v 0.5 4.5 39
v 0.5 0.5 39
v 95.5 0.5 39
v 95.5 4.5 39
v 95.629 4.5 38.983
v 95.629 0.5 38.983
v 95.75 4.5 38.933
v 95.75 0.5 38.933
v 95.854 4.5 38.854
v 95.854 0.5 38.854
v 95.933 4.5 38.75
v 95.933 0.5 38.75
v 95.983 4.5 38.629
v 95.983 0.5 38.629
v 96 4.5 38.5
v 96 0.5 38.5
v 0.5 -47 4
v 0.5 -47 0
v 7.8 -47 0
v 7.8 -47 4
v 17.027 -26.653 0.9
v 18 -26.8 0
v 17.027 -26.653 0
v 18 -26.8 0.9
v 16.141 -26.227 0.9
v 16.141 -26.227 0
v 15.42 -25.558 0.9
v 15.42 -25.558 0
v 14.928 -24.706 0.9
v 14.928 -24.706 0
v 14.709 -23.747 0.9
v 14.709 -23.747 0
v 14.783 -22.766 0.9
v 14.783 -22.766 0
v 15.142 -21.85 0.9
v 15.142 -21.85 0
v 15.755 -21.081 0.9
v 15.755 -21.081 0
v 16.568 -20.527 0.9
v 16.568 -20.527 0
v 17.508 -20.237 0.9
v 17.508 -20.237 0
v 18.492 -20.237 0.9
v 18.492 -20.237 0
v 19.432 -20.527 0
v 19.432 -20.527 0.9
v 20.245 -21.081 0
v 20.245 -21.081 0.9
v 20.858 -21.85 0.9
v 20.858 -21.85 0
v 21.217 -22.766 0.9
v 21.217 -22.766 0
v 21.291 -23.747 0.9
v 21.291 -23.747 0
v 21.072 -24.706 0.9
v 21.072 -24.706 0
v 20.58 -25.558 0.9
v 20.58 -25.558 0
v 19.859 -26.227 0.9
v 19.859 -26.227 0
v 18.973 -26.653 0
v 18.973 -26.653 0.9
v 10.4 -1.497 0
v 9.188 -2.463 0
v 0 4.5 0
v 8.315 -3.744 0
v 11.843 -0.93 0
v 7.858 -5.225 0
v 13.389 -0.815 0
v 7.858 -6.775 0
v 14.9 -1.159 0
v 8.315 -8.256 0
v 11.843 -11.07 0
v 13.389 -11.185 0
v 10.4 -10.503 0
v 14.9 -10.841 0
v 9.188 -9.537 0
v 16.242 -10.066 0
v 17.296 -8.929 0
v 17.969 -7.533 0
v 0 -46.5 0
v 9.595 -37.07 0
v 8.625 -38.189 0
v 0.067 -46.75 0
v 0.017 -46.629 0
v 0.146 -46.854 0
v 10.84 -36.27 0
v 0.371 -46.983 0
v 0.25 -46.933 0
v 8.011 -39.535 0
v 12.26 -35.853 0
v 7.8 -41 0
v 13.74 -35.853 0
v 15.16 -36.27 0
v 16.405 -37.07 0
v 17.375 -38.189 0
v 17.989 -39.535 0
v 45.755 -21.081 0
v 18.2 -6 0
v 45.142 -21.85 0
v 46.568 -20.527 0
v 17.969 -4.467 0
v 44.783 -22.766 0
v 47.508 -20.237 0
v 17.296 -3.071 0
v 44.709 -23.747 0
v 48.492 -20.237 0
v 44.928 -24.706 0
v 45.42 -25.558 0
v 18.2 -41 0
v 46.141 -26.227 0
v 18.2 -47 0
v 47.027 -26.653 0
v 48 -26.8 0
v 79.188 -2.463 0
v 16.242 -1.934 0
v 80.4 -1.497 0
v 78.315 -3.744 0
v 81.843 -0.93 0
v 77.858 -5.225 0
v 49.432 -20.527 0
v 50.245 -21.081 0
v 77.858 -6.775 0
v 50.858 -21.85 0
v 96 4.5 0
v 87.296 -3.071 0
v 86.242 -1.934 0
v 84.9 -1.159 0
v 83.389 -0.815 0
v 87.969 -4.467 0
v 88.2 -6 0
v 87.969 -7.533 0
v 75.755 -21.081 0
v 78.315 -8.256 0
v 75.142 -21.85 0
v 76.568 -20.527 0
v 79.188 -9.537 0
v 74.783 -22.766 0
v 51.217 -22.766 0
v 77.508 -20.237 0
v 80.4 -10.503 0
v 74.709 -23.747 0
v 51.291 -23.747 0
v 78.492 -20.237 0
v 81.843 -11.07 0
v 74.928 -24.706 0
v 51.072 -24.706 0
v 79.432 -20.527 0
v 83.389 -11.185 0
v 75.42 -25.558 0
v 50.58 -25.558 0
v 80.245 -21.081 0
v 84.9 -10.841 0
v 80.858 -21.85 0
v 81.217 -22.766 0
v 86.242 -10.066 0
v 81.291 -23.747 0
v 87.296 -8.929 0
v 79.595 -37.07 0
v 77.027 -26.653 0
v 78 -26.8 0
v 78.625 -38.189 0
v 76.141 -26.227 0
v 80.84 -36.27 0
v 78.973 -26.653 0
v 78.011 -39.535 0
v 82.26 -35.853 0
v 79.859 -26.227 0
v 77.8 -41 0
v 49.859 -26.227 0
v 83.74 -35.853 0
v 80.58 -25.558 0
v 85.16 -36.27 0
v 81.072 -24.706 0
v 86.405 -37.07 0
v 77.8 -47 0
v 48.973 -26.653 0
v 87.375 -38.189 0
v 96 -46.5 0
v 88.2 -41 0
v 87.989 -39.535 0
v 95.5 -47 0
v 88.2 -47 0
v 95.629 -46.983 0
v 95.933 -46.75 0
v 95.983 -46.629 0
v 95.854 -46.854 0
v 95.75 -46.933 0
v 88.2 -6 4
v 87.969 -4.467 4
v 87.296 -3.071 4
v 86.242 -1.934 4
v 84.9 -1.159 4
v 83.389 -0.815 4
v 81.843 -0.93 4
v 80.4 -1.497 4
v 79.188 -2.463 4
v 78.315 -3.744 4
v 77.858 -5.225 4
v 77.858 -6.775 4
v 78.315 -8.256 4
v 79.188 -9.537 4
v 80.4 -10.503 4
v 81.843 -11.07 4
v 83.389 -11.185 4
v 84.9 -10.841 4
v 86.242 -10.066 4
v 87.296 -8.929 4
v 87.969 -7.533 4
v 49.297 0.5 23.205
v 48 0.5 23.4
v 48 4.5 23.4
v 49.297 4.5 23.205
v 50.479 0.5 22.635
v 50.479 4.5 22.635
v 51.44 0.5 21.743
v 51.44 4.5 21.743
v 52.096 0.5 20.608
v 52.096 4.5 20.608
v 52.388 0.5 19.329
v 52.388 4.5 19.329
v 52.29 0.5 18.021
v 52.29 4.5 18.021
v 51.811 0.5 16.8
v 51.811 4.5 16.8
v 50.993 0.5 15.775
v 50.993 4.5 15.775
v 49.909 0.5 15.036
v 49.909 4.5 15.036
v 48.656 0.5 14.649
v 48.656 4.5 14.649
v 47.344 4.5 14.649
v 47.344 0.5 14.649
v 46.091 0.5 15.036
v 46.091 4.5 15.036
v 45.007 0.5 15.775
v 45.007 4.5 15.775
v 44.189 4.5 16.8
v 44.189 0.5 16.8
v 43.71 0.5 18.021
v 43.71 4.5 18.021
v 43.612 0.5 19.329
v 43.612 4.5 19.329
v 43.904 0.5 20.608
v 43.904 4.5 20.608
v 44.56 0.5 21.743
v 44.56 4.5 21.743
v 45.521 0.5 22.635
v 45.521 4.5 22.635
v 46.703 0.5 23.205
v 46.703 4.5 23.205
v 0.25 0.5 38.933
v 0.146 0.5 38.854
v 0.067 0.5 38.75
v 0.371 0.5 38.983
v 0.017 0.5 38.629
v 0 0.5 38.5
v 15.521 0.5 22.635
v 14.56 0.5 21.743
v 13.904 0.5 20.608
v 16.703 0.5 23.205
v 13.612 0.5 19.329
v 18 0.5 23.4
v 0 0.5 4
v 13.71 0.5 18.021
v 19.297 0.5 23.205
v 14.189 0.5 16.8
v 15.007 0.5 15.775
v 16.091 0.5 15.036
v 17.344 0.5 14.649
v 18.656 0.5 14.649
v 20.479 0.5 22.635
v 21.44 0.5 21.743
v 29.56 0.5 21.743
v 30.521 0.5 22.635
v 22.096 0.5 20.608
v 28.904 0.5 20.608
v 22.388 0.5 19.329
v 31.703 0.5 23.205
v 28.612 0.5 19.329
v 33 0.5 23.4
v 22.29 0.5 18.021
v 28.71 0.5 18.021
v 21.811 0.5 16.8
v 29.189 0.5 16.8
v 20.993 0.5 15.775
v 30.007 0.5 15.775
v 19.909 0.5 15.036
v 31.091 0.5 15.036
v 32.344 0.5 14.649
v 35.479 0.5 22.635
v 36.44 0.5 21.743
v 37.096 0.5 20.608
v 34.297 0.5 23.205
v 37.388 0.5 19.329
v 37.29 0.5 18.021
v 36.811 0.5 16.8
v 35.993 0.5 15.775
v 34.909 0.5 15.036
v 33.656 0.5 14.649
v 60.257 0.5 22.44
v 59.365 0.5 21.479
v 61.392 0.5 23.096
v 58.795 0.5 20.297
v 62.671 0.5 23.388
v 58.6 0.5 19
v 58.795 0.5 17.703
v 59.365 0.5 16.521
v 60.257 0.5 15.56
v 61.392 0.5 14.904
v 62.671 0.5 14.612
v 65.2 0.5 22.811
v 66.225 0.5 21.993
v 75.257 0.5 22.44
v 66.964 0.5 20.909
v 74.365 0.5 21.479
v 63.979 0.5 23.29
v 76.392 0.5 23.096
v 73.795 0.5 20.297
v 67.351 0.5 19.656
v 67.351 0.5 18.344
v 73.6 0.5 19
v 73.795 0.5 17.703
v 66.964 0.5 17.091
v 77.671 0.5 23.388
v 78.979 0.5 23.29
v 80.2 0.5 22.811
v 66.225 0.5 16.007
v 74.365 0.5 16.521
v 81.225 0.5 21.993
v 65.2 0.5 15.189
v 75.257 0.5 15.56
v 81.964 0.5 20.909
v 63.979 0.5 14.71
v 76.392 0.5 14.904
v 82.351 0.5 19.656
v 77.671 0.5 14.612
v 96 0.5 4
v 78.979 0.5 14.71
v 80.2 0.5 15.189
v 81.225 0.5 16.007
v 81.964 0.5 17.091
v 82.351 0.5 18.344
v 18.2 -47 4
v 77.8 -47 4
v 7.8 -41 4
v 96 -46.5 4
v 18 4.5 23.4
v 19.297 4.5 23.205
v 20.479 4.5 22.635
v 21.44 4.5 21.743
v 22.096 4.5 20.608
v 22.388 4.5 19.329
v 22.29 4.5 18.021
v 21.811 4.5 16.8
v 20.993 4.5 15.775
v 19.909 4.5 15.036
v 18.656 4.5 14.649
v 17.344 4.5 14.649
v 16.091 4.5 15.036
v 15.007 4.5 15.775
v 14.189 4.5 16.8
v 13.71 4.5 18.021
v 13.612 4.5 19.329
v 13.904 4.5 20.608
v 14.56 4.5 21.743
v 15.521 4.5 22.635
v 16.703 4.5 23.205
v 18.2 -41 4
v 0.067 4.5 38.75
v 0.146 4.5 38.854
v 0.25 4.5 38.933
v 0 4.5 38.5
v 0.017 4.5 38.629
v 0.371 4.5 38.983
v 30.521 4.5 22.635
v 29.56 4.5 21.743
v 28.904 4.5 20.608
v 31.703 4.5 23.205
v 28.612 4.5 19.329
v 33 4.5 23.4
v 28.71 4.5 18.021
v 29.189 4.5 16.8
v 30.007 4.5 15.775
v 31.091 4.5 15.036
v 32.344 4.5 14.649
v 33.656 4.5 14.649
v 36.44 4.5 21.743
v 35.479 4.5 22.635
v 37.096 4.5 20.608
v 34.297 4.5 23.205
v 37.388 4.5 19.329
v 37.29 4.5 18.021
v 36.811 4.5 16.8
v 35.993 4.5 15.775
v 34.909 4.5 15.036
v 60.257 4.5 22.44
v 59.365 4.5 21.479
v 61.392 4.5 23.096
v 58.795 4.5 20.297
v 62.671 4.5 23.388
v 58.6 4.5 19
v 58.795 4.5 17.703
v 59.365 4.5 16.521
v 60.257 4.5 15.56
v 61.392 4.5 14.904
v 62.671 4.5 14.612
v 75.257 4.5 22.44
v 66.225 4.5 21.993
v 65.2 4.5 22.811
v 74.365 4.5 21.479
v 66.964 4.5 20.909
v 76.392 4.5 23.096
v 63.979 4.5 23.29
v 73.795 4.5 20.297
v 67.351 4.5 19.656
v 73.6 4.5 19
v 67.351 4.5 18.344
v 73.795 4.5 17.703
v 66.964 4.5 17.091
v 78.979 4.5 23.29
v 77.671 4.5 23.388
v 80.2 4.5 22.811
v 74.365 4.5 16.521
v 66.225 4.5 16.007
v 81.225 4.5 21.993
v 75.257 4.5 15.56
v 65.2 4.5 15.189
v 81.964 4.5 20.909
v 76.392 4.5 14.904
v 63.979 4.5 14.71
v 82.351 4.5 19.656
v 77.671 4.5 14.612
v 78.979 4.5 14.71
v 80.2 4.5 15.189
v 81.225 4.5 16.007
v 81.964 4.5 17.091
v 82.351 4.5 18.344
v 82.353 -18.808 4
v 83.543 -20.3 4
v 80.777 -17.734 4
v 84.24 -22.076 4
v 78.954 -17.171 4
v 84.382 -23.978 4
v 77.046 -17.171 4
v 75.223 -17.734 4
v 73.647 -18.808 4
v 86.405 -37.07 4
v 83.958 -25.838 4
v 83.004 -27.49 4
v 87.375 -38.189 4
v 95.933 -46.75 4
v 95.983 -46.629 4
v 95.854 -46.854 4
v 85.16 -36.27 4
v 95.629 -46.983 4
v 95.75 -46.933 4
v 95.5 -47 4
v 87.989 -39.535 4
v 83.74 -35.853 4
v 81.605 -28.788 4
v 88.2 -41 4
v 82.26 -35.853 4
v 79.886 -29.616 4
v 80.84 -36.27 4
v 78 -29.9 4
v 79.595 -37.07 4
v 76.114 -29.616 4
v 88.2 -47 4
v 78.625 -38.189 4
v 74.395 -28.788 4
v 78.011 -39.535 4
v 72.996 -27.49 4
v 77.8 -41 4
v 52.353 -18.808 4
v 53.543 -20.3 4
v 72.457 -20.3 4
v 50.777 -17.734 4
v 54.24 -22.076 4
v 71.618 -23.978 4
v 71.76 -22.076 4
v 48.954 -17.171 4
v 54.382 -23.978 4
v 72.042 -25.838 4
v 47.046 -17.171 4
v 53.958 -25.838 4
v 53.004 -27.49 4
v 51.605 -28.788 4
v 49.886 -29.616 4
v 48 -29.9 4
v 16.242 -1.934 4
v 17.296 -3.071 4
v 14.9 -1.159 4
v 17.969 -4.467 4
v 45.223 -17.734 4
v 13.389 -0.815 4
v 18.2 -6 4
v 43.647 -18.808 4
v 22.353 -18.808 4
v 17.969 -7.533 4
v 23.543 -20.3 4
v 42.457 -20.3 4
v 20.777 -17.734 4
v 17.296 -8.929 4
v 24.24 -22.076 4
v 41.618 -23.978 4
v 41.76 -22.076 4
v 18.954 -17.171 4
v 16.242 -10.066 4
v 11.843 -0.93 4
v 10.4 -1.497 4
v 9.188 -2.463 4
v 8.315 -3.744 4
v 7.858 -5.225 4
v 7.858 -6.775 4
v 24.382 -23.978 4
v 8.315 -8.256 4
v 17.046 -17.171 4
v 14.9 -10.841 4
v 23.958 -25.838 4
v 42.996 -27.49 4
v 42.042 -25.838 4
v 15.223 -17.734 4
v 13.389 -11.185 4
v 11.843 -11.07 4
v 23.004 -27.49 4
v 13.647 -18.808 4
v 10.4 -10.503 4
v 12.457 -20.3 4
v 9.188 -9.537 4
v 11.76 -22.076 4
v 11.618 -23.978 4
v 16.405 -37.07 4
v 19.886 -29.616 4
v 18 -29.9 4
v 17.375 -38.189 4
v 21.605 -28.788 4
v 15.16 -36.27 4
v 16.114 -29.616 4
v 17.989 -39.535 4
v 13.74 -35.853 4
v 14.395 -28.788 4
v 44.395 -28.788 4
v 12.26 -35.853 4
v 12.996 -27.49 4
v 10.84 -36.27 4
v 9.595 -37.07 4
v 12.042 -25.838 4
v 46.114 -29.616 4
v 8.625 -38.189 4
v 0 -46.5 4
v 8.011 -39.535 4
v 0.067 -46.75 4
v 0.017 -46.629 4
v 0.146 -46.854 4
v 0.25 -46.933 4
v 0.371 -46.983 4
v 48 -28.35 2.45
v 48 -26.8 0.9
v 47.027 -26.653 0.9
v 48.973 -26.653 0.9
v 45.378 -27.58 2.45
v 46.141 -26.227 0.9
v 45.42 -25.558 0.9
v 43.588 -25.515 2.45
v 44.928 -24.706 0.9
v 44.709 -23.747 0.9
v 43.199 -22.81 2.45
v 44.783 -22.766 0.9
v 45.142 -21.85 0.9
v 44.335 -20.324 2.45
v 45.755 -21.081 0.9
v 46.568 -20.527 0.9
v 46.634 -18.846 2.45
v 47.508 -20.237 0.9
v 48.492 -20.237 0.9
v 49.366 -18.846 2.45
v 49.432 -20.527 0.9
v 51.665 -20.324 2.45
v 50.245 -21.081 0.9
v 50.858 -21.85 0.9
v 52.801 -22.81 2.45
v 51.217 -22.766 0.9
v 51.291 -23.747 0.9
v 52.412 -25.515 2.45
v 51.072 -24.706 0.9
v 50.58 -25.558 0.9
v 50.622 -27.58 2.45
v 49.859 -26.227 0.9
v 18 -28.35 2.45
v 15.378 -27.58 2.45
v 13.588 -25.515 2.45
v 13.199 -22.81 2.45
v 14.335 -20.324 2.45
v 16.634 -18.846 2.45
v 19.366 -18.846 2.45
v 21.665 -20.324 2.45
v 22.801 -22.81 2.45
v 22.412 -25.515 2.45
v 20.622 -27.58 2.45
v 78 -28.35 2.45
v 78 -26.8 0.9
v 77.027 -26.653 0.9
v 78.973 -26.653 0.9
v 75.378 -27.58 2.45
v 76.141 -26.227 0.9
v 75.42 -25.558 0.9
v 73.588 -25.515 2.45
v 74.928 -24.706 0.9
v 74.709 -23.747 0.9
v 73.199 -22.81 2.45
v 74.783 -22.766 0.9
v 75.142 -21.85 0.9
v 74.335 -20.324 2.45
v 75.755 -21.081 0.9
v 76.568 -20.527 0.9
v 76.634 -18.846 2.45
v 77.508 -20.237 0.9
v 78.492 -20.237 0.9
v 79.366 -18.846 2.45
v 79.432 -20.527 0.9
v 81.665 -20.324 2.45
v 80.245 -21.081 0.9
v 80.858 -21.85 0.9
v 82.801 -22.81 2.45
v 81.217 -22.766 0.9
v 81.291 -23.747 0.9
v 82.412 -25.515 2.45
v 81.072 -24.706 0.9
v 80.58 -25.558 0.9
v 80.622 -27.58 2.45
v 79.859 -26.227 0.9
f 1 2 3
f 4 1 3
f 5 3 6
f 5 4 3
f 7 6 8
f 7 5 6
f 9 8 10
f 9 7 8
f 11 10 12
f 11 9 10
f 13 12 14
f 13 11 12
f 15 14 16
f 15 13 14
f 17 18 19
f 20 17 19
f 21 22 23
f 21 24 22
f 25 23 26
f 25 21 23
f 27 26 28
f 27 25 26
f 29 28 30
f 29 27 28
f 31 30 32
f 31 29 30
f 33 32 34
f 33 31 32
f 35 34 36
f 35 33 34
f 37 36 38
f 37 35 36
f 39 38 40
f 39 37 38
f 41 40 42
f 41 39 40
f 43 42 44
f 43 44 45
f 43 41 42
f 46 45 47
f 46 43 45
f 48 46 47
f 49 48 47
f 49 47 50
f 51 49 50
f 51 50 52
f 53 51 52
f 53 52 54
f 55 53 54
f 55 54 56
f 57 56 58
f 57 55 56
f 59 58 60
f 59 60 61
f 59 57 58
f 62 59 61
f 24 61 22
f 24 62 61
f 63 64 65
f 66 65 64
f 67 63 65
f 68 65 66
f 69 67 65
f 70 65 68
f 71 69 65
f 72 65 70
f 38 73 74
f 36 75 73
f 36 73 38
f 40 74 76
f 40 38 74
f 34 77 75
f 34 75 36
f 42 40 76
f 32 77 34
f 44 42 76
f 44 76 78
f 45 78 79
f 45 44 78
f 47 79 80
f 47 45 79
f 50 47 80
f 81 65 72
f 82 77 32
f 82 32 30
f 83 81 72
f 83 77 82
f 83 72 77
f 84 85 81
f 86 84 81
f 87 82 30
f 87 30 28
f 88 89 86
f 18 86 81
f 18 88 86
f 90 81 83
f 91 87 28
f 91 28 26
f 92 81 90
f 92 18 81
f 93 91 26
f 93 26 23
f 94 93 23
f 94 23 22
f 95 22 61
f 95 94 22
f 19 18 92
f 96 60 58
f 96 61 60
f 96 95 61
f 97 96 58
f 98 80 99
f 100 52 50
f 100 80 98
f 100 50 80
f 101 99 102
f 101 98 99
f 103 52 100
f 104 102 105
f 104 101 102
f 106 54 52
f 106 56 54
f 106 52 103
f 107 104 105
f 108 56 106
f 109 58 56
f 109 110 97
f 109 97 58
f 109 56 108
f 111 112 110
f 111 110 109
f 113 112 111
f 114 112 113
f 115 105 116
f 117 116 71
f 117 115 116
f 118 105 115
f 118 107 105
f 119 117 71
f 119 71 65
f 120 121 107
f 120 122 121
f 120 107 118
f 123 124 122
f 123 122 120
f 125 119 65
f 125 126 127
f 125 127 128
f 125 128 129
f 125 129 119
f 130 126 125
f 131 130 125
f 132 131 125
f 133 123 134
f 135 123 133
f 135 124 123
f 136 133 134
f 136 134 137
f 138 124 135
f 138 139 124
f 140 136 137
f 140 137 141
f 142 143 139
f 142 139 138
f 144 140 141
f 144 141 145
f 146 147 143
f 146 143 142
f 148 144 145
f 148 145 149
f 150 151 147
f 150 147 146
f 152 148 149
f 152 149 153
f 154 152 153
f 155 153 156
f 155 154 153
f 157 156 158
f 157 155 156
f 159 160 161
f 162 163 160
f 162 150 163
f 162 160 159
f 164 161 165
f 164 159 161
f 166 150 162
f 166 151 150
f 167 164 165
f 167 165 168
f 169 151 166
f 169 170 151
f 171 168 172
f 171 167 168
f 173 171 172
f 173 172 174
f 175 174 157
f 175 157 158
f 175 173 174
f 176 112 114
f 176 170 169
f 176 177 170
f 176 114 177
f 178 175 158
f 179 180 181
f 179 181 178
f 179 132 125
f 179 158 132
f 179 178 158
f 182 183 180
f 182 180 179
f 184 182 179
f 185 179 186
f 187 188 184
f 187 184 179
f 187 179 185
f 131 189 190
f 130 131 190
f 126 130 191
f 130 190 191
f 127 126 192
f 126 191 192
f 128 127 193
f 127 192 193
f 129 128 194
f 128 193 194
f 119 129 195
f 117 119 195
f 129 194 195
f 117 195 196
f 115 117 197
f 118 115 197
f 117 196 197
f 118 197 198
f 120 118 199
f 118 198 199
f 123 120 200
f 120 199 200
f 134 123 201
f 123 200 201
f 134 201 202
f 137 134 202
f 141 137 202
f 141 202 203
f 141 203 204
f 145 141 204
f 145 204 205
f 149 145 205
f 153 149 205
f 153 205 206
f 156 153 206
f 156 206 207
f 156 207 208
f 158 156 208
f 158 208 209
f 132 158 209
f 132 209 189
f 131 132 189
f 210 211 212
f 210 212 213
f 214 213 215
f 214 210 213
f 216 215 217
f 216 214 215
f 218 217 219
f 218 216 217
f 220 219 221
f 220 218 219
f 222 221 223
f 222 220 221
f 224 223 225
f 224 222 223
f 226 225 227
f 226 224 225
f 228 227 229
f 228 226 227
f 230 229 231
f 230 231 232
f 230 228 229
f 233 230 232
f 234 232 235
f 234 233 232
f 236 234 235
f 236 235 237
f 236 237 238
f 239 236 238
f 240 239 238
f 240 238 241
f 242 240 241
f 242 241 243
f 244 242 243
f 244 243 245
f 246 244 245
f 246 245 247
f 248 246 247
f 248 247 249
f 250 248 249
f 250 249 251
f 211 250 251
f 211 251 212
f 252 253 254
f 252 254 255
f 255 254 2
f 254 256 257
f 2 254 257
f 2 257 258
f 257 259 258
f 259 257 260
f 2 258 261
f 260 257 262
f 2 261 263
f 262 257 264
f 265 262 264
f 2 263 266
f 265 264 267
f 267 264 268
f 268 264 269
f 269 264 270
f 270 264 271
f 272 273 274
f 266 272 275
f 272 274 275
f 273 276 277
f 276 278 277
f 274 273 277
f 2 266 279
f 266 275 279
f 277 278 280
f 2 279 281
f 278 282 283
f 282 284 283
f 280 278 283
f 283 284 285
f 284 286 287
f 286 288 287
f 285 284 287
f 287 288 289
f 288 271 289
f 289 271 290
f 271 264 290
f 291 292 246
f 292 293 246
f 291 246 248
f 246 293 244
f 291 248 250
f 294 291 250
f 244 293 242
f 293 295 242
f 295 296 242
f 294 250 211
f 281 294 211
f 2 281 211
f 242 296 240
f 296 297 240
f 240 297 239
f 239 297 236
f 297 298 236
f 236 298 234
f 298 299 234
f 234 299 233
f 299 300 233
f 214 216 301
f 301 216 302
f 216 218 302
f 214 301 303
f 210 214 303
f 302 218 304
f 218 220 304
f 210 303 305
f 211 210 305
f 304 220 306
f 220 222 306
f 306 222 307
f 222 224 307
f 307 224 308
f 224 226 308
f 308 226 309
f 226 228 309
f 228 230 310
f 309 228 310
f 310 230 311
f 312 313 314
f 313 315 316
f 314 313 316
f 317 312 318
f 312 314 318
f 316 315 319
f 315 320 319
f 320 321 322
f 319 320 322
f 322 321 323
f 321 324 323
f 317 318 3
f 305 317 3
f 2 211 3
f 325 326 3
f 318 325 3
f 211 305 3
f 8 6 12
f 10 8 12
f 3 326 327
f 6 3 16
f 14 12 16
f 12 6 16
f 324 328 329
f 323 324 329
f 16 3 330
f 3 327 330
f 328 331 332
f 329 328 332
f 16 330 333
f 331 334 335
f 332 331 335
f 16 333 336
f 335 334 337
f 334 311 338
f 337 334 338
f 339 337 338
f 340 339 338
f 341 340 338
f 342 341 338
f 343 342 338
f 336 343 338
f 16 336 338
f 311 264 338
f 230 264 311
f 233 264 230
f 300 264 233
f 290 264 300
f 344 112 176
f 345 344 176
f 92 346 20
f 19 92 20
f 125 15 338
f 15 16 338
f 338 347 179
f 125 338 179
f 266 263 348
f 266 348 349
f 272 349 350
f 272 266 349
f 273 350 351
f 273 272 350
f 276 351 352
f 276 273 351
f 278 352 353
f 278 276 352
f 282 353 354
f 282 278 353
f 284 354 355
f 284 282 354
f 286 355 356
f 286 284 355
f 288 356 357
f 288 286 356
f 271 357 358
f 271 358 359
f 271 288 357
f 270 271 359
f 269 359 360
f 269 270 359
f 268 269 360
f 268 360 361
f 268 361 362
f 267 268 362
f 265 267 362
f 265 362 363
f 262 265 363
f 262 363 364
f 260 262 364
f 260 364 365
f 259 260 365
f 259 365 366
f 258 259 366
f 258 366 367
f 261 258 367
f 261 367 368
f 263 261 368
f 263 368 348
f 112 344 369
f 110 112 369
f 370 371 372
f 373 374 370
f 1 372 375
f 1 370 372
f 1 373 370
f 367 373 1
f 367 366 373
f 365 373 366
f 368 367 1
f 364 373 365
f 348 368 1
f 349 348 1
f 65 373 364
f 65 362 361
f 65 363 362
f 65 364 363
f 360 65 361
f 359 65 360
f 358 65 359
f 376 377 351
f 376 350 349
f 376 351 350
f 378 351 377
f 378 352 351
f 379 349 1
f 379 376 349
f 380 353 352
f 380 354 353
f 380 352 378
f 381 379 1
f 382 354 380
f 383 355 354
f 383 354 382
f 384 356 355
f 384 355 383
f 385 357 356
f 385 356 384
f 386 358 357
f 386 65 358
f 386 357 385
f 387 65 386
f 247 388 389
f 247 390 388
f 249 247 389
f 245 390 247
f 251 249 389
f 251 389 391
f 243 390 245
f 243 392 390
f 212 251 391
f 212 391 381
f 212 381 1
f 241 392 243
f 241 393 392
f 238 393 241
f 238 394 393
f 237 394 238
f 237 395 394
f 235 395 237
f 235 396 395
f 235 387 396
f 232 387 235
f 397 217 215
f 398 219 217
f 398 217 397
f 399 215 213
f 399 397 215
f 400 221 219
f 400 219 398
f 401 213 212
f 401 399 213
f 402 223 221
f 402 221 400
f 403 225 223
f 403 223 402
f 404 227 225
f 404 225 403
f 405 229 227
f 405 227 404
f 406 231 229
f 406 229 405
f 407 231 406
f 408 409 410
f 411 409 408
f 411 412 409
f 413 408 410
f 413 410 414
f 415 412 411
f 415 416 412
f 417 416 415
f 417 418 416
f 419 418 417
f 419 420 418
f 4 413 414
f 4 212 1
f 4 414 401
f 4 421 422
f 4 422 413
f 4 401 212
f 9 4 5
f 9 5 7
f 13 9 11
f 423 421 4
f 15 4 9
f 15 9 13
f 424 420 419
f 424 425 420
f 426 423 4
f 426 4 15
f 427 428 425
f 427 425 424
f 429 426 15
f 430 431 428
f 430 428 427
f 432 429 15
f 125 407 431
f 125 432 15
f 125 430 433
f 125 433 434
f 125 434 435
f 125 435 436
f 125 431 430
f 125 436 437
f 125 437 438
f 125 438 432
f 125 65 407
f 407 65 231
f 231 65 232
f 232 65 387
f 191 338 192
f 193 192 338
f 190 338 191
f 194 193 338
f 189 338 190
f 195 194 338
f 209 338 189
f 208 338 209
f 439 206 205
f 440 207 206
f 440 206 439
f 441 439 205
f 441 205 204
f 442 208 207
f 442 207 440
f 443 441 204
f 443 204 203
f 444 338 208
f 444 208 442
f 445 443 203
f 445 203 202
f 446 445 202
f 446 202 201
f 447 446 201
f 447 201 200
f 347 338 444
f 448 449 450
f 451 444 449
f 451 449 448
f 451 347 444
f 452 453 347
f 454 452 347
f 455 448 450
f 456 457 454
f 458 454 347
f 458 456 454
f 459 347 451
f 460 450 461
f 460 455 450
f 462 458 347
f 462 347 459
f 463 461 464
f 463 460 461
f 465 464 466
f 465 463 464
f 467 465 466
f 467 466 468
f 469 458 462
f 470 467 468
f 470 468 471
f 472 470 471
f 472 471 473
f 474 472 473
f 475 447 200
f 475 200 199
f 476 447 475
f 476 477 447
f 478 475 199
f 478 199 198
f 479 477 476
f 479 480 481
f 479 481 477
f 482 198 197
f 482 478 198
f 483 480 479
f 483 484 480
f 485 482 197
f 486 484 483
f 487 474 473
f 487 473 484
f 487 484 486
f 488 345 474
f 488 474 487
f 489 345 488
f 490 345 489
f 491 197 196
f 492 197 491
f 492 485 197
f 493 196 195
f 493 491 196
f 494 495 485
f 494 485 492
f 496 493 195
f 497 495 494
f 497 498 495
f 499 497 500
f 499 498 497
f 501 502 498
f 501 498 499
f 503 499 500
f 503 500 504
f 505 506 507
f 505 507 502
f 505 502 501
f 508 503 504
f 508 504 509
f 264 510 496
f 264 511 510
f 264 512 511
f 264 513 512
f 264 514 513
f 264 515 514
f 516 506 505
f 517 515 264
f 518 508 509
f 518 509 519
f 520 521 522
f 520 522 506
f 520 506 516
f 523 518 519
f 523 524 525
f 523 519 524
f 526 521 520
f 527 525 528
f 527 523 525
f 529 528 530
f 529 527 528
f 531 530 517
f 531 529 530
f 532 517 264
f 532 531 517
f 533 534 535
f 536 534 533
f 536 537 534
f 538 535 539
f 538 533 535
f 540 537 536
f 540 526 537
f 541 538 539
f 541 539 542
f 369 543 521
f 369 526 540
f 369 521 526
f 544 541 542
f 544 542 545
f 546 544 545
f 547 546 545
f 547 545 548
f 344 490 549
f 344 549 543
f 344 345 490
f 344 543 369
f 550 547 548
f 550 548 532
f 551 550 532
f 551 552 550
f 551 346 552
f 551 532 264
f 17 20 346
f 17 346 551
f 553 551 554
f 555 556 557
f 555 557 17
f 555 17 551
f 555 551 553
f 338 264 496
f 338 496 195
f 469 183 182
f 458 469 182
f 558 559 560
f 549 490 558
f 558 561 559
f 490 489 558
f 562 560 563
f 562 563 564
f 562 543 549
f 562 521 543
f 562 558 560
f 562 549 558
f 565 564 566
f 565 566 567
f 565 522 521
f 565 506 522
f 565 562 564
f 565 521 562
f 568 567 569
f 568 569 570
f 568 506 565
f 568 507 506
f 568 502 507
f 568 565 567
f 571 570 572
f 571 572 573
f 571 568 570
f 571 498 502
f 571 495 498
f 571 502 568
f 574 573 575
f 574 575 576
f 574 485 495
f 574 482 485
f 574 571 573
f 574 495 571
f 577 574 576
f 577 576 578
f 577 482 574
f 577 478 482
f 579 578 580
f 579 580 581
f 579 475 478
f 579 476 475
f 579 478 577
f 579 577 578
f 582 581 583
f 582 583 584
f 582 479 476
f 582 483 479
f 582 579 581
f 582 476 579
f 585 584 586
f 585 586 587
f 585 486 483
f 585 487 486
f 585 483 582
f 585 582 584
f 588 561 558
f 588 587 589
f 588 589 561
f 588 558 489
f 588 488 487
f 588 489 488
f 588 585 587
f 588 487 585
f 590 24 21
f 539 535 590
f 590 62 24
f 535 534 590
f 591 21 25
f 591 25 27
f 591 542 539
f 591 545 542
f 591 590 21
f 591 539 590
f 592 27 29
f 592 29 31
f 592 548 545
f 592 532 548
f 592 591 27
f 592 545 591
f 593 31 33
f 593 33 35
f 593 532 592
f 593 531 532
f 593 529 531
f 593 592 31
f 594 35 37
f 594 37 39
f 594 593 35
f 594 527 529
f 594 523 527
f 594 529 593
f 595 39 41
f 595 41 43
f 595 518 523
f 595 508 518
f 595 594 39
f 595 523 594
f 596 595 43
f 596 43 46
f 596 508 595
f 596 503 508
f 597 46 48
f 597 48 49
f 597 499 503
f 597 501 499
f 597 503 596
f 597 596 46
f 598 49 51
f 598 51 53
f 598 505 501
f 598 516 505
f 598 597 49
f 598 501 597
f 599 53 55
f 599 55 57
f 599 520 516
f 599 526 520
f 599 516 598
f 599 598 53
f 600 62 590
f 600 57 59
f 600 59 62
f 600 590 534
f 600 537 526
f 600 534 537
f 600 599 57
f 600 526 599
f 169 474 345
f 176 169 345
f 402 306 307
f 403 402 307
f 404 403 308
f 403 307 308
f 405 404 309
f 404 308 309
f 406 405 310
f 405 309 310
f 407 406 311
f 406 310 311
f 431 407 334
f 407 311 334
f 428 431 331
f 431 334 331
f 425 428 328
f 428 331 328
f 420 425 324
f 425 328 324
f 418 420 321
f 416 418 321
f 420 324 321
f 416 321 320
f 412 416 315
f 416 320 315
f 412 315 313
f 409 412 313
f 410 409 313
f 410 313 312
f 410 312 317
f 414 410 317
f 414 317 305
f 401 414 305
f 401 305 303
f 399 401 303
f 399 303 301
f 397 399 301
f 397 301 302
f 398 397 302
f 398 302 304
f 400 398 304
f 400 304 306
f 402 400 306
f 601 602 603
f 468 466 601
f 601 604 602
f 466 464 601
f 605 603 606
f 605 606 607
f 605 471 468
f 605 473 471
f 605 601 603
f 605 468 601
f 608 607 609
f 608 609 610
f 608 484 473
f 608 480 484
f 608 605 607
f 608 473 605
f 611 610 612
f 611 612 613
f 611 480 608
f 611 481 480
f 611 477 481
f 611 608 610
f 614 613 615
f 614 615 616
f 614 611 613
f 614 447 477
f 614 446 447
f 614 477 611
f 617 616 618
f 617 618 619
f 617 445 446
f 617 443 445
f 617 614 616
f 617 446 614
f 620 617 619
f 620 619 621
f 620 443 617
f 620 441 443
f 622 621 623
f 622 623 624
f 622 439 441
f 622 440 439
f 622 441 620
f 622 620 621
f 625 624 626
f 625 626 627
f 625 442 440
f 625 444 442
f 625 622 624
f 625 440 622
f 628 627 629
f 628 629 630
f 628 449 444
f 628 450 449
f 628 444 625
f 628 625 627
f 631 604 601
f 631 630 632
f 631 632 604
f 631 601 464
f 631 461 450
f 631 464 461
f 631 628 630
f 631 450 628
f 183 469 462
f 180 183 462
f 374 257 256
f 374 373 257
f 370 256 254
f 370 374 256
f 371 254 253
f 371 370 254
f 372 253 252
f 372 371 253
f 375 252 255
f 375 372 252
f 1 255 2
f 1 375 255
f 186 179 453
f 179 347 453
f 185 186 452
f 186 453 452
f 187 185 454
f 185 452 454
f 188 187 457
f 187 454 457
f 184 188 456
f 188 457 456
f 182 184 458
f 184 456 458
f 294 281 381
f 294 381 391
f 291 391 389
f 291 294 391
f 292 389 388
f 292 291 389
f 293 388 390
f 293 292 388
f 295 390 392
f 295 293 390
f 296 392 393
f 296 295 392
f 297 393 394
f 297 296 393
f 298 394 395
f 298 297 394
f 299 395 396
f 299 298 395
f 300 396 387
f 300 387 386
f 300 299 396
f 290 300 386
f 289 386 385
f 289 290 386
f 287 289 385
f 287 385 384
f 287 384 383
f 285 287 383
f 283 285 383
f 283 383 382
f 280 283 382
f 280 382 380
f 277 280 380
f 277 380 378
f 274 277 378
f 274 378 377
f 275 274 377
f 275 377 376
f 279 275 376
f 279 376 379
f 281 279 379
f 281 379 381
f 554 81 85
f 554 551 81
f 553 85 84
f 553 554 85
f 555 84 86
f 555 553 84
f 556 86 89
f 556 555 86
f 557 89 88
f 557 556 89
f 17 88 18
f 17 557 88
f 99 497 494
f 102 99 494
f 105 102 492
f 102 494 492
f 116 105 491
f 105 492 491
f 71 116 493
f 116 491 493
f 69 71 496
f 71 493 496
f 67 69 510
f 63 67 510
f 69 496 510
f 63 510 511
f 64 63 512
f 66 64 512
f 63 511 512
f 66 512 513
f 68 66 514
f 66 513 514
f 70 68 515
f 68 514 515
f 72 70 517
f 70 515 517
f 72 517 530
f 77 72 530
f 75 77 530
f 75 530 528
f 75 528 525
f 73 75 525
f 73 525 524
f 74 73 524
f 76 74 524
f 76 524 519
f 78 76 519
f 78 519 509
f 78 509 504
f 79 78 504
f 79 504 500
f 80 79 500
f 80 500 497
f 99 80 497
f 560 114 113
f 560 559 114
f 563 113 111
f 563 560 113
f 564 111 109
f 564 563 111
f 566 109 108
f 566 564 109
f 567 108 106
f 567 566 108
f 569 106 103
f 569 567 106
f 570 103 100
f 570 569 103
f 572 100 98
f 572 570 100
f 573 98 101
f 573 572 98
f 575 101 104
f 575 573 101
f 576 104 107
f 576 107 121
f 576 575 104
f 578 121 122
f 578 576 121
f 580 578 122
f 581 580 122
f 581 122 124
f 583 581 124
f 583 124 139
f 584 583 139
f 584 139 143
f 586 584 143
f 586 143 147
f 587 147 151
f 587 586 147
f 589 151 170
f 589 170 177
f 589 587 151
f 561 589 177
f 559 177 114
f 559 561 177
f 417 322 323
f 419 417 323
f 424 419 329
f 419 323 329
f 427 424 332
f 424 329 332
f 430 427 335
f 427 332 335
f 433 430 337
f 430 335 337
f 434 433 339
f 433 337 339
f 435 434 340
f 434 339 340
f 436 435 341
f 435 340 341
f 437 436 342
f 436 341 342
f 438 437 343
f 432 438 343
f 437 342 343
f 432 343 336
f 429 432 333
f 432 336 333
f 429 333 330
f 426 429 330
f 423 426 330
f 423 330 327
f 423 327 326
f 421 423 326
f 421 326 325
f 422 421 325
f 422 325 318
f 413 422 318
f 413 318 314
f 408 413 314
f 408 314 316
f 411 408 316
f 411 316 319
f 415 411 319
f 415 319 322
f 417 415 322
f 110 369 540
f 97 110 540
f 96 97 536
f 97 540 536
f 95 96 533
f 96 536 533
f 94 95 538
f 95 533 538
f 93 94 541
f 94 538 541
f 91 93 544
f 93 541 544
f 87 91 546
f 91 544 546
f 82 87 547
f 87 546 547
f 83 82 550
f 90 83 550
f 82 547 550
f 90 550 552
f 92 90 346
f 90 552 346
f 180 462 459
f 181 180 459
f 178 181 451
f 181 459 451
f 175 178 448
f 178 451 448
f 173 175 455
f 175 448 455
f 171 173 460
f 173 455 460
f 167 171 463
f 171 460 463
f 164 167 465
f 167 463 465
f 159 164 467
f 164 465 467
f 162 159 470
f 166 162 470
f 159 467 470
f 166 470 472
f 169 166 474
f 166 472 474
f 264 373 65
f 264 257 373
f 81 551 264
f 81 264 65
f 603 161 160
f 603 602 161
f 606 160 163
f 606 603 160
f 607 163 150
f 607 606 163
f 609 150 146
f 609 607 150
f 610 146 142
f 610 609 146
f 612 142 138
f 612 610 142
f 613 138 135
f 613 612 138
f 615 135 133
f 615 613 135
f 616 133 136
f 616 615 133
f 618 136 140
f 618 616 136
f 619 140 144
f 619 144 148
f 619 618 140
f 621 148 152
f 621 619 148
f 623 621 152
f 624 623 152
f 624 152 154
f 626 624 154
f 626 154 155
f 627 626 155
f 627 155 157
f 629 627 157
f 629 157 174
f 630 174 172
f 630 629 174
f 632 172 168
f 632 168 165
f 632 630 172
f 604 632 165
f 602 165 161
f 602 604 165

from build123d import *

# Parameters (mm, degrees)
SKETCH_1_W                  = 96
SKETCH_1_H                  = 47
EXTRUDE_1_DEPTH             = 4
SKETCH_12_W                 = 96
SKETCH_12_H                 = 39
SKETCH_12_R                 = 4.4
EXTRUDE_3_DEPTH             = 4.5
SKETCH_12_4_R               = 4.4
CUT_EXTRUDE_1_DEPTH         = 0.5
SKETCH_2_R                  = 5.2
CUT_EXTRUDE_2_DEPTH         = 10
HOLE_WIZARD_M6_1_AT_2_COUNT = 2
HOLE_WIZARD_M6_1_AT_2_PITCH = 30
HOLE_WIZARD_M6_1_AT_3_COUNT = 2
HOLE_WIZARD_M6_1_AT_3_PITCH = 60
FILLET_1_R                  = 0.5


with BuildPart() as part:
    # 草图1 → 凸台-拉伸1 (new body)
    with BuildSketch(Plane.XY):
        with Locations((48, -23.5)):
            Rectangle(SKETCH_1_W, SKETCH_1_H)
    extrude(amount=EXTRUDE_1_DEPTH)

    # 草图12 → 凸台-拉伸3 (add)
    with BuildSketch(Plane(origin=(0, 0, 0), x_dir=(1, 0, 0), z_dir=(0, 1, 0))):
        with Locations((48, -19.5)):
            Rectangle(SKETCH_12_W, SKETCH_12_H)
        with Locations((18, -19)):
            Circle(SKETCH_12_R, mode=Mode.SUBTRACT)
        with Locations((33, -19)):
            Circle(SKETCH_12_R, mode=Mode.SUBTRACT)
        with Locations((48, -19)):
            Circle(SKETCH_12_R, mode=Mode.SUBTRACT)
        with BuildLine():
            ThreePointArc((67.4, -19), (63, -23.4), (58.6, -19))
            ThreePointArc((58.6, -19), (63, -14.6), (67.4, -19))
        make_face(mode=Mode.SUBTRACT)
        with Locations((78, -19)):
            Circle(SKETCH_12_R, mode=Mode.SUBTRACT)
    extrude(amount=EXTRUDE_3_DEPTH)

    # 草图12<4> → 切除-拉伸1 (cut)
    with BuildSketch(Plane(origin=(0, 0, 0), x_dir=(1, 0, 0), z_dir=(0, 1, 0))):
        Polygon((96, -4), (0, -4), (0, -5), (0, -39), (96, -39), align=None)
        with Locations((18, -19)):
            Circle(SKETCH_12_4_R, mode=Mode.SUBTRACT)
        with Locations((33, -19)):
            Circle(SKETCH_12_4_R, mode=Mode.SUBTRACT)
        with Locations((48, -19)):
            Circle(SKETCH_12_4_R, mode=Mode.SUBTRACT)
        with BuildLine():
            ThreePointArc((67.4, -19), (63, -23.4), (58.6, -19))
            ThreePointArc((58.6, -19), (63, -14.6), (67.4, -19))
        make_face(mode=Mode.SUBTRACT)
        with BuildLine():
            ThreePointArc((82.4, -19), (78, -23.4), (73.6, -19))
            ThreePointArc((73.6, -19), (78, -14.6), (82.4, -19))
        make_face(mode=Mode.SUBTRACT)
    extrude(amount=CUT_EXTRUDE_1_DEPTH, mode=Mode.SUBTRACT)

    # 草图2 → 切除-拉伸2 (cut)
    with BuildSketch(Plane.XY.offset(4)):
        with BuildLine():
            Line((77.8, -41), (77.8, -47))
            Line((77.8, -47), (88.2, -47))
            Line((88.2, -47), (88.2, -41))
            ThreePointArc((88.2, -41), (83, -35.8), (77.8, -41))
        make_face()
        with BuildLine():
            Line((7.8, -47), (18.2, -47))
            Line((18.2, -47), (18.2, -41))
            ThreePointArc((18.2, -41), (13, -35.8), (7.8, -41))
            Line((7.8, -41), (7.8, -47))
        make_face()
        with Locations((83, -6)):
            Circle(SKETCH_2_R)
        with Locations((13, -6)):
            Circle(SKETCH_2_R)
    extrude(amount=-CUT_EXTRUDE_2_DEPTH, mode=Mode.SUBTRACT)

    # 草图15 → M6 内六角花形沉头螺钉的锥形沉头孔1 (revolve, cut)
    with BuildSketch(Plane(origin=(18, -23.5, 4), x_dir=(0, -1, 0), z_dir=(1, 0, 0))):
        Polygon((0, 0), (0, 4), (3.3, 4), (3.3, 3.1), (6.4, 0), align=None)
    hole_wizard_m6_1 = revolve(axis=Axis((18, -23.5, 10.35), (0, 0, -1)), mode=Mode.SUBTRACT)

    # M6 内六角花形沉头螺钉的锥形沉头孔1 at 2: M6 内六角花形沉头螺钉的锥形沉头孔1 ×2
    with Locations(*[(i * HOLE_WIZARD_M6_1_AT_2_PITCH, 0, 0) for i in range(1, HOLE_WIZARD_M6_1_AT_2_COUNT)]):
        add(hole_wizard_m6_1, mode=Mode.SUBTRACT)

    # M6 内六角花形沉头螺钉的锥形沉头孔1 at 3: M6 内六角花形沉头螺钉的锥形沉头孔1 ×2
    with Locations(*[(i * HOLE_WIZARD_M6_1_AT_3_PITCH, 0, 0) for i in range(1, HOLE_WIZARD_M6_1_AT_3_COUNT)]):
        add(hole_wizard_m6_1, mode=Mode.SUBTRACT)

    # 圆角1
    fillet_1_edges = [part.edges().sort_by_distance(p)[0] for p in [
        (0, -47, 2),
        (96, -47, 2),
        (96, 2.5, 39),
        (0, 2.5, 39),
    ]]
    fillet(fillet_1_edges, radius=FILLET_1_R)


solid = part.part
